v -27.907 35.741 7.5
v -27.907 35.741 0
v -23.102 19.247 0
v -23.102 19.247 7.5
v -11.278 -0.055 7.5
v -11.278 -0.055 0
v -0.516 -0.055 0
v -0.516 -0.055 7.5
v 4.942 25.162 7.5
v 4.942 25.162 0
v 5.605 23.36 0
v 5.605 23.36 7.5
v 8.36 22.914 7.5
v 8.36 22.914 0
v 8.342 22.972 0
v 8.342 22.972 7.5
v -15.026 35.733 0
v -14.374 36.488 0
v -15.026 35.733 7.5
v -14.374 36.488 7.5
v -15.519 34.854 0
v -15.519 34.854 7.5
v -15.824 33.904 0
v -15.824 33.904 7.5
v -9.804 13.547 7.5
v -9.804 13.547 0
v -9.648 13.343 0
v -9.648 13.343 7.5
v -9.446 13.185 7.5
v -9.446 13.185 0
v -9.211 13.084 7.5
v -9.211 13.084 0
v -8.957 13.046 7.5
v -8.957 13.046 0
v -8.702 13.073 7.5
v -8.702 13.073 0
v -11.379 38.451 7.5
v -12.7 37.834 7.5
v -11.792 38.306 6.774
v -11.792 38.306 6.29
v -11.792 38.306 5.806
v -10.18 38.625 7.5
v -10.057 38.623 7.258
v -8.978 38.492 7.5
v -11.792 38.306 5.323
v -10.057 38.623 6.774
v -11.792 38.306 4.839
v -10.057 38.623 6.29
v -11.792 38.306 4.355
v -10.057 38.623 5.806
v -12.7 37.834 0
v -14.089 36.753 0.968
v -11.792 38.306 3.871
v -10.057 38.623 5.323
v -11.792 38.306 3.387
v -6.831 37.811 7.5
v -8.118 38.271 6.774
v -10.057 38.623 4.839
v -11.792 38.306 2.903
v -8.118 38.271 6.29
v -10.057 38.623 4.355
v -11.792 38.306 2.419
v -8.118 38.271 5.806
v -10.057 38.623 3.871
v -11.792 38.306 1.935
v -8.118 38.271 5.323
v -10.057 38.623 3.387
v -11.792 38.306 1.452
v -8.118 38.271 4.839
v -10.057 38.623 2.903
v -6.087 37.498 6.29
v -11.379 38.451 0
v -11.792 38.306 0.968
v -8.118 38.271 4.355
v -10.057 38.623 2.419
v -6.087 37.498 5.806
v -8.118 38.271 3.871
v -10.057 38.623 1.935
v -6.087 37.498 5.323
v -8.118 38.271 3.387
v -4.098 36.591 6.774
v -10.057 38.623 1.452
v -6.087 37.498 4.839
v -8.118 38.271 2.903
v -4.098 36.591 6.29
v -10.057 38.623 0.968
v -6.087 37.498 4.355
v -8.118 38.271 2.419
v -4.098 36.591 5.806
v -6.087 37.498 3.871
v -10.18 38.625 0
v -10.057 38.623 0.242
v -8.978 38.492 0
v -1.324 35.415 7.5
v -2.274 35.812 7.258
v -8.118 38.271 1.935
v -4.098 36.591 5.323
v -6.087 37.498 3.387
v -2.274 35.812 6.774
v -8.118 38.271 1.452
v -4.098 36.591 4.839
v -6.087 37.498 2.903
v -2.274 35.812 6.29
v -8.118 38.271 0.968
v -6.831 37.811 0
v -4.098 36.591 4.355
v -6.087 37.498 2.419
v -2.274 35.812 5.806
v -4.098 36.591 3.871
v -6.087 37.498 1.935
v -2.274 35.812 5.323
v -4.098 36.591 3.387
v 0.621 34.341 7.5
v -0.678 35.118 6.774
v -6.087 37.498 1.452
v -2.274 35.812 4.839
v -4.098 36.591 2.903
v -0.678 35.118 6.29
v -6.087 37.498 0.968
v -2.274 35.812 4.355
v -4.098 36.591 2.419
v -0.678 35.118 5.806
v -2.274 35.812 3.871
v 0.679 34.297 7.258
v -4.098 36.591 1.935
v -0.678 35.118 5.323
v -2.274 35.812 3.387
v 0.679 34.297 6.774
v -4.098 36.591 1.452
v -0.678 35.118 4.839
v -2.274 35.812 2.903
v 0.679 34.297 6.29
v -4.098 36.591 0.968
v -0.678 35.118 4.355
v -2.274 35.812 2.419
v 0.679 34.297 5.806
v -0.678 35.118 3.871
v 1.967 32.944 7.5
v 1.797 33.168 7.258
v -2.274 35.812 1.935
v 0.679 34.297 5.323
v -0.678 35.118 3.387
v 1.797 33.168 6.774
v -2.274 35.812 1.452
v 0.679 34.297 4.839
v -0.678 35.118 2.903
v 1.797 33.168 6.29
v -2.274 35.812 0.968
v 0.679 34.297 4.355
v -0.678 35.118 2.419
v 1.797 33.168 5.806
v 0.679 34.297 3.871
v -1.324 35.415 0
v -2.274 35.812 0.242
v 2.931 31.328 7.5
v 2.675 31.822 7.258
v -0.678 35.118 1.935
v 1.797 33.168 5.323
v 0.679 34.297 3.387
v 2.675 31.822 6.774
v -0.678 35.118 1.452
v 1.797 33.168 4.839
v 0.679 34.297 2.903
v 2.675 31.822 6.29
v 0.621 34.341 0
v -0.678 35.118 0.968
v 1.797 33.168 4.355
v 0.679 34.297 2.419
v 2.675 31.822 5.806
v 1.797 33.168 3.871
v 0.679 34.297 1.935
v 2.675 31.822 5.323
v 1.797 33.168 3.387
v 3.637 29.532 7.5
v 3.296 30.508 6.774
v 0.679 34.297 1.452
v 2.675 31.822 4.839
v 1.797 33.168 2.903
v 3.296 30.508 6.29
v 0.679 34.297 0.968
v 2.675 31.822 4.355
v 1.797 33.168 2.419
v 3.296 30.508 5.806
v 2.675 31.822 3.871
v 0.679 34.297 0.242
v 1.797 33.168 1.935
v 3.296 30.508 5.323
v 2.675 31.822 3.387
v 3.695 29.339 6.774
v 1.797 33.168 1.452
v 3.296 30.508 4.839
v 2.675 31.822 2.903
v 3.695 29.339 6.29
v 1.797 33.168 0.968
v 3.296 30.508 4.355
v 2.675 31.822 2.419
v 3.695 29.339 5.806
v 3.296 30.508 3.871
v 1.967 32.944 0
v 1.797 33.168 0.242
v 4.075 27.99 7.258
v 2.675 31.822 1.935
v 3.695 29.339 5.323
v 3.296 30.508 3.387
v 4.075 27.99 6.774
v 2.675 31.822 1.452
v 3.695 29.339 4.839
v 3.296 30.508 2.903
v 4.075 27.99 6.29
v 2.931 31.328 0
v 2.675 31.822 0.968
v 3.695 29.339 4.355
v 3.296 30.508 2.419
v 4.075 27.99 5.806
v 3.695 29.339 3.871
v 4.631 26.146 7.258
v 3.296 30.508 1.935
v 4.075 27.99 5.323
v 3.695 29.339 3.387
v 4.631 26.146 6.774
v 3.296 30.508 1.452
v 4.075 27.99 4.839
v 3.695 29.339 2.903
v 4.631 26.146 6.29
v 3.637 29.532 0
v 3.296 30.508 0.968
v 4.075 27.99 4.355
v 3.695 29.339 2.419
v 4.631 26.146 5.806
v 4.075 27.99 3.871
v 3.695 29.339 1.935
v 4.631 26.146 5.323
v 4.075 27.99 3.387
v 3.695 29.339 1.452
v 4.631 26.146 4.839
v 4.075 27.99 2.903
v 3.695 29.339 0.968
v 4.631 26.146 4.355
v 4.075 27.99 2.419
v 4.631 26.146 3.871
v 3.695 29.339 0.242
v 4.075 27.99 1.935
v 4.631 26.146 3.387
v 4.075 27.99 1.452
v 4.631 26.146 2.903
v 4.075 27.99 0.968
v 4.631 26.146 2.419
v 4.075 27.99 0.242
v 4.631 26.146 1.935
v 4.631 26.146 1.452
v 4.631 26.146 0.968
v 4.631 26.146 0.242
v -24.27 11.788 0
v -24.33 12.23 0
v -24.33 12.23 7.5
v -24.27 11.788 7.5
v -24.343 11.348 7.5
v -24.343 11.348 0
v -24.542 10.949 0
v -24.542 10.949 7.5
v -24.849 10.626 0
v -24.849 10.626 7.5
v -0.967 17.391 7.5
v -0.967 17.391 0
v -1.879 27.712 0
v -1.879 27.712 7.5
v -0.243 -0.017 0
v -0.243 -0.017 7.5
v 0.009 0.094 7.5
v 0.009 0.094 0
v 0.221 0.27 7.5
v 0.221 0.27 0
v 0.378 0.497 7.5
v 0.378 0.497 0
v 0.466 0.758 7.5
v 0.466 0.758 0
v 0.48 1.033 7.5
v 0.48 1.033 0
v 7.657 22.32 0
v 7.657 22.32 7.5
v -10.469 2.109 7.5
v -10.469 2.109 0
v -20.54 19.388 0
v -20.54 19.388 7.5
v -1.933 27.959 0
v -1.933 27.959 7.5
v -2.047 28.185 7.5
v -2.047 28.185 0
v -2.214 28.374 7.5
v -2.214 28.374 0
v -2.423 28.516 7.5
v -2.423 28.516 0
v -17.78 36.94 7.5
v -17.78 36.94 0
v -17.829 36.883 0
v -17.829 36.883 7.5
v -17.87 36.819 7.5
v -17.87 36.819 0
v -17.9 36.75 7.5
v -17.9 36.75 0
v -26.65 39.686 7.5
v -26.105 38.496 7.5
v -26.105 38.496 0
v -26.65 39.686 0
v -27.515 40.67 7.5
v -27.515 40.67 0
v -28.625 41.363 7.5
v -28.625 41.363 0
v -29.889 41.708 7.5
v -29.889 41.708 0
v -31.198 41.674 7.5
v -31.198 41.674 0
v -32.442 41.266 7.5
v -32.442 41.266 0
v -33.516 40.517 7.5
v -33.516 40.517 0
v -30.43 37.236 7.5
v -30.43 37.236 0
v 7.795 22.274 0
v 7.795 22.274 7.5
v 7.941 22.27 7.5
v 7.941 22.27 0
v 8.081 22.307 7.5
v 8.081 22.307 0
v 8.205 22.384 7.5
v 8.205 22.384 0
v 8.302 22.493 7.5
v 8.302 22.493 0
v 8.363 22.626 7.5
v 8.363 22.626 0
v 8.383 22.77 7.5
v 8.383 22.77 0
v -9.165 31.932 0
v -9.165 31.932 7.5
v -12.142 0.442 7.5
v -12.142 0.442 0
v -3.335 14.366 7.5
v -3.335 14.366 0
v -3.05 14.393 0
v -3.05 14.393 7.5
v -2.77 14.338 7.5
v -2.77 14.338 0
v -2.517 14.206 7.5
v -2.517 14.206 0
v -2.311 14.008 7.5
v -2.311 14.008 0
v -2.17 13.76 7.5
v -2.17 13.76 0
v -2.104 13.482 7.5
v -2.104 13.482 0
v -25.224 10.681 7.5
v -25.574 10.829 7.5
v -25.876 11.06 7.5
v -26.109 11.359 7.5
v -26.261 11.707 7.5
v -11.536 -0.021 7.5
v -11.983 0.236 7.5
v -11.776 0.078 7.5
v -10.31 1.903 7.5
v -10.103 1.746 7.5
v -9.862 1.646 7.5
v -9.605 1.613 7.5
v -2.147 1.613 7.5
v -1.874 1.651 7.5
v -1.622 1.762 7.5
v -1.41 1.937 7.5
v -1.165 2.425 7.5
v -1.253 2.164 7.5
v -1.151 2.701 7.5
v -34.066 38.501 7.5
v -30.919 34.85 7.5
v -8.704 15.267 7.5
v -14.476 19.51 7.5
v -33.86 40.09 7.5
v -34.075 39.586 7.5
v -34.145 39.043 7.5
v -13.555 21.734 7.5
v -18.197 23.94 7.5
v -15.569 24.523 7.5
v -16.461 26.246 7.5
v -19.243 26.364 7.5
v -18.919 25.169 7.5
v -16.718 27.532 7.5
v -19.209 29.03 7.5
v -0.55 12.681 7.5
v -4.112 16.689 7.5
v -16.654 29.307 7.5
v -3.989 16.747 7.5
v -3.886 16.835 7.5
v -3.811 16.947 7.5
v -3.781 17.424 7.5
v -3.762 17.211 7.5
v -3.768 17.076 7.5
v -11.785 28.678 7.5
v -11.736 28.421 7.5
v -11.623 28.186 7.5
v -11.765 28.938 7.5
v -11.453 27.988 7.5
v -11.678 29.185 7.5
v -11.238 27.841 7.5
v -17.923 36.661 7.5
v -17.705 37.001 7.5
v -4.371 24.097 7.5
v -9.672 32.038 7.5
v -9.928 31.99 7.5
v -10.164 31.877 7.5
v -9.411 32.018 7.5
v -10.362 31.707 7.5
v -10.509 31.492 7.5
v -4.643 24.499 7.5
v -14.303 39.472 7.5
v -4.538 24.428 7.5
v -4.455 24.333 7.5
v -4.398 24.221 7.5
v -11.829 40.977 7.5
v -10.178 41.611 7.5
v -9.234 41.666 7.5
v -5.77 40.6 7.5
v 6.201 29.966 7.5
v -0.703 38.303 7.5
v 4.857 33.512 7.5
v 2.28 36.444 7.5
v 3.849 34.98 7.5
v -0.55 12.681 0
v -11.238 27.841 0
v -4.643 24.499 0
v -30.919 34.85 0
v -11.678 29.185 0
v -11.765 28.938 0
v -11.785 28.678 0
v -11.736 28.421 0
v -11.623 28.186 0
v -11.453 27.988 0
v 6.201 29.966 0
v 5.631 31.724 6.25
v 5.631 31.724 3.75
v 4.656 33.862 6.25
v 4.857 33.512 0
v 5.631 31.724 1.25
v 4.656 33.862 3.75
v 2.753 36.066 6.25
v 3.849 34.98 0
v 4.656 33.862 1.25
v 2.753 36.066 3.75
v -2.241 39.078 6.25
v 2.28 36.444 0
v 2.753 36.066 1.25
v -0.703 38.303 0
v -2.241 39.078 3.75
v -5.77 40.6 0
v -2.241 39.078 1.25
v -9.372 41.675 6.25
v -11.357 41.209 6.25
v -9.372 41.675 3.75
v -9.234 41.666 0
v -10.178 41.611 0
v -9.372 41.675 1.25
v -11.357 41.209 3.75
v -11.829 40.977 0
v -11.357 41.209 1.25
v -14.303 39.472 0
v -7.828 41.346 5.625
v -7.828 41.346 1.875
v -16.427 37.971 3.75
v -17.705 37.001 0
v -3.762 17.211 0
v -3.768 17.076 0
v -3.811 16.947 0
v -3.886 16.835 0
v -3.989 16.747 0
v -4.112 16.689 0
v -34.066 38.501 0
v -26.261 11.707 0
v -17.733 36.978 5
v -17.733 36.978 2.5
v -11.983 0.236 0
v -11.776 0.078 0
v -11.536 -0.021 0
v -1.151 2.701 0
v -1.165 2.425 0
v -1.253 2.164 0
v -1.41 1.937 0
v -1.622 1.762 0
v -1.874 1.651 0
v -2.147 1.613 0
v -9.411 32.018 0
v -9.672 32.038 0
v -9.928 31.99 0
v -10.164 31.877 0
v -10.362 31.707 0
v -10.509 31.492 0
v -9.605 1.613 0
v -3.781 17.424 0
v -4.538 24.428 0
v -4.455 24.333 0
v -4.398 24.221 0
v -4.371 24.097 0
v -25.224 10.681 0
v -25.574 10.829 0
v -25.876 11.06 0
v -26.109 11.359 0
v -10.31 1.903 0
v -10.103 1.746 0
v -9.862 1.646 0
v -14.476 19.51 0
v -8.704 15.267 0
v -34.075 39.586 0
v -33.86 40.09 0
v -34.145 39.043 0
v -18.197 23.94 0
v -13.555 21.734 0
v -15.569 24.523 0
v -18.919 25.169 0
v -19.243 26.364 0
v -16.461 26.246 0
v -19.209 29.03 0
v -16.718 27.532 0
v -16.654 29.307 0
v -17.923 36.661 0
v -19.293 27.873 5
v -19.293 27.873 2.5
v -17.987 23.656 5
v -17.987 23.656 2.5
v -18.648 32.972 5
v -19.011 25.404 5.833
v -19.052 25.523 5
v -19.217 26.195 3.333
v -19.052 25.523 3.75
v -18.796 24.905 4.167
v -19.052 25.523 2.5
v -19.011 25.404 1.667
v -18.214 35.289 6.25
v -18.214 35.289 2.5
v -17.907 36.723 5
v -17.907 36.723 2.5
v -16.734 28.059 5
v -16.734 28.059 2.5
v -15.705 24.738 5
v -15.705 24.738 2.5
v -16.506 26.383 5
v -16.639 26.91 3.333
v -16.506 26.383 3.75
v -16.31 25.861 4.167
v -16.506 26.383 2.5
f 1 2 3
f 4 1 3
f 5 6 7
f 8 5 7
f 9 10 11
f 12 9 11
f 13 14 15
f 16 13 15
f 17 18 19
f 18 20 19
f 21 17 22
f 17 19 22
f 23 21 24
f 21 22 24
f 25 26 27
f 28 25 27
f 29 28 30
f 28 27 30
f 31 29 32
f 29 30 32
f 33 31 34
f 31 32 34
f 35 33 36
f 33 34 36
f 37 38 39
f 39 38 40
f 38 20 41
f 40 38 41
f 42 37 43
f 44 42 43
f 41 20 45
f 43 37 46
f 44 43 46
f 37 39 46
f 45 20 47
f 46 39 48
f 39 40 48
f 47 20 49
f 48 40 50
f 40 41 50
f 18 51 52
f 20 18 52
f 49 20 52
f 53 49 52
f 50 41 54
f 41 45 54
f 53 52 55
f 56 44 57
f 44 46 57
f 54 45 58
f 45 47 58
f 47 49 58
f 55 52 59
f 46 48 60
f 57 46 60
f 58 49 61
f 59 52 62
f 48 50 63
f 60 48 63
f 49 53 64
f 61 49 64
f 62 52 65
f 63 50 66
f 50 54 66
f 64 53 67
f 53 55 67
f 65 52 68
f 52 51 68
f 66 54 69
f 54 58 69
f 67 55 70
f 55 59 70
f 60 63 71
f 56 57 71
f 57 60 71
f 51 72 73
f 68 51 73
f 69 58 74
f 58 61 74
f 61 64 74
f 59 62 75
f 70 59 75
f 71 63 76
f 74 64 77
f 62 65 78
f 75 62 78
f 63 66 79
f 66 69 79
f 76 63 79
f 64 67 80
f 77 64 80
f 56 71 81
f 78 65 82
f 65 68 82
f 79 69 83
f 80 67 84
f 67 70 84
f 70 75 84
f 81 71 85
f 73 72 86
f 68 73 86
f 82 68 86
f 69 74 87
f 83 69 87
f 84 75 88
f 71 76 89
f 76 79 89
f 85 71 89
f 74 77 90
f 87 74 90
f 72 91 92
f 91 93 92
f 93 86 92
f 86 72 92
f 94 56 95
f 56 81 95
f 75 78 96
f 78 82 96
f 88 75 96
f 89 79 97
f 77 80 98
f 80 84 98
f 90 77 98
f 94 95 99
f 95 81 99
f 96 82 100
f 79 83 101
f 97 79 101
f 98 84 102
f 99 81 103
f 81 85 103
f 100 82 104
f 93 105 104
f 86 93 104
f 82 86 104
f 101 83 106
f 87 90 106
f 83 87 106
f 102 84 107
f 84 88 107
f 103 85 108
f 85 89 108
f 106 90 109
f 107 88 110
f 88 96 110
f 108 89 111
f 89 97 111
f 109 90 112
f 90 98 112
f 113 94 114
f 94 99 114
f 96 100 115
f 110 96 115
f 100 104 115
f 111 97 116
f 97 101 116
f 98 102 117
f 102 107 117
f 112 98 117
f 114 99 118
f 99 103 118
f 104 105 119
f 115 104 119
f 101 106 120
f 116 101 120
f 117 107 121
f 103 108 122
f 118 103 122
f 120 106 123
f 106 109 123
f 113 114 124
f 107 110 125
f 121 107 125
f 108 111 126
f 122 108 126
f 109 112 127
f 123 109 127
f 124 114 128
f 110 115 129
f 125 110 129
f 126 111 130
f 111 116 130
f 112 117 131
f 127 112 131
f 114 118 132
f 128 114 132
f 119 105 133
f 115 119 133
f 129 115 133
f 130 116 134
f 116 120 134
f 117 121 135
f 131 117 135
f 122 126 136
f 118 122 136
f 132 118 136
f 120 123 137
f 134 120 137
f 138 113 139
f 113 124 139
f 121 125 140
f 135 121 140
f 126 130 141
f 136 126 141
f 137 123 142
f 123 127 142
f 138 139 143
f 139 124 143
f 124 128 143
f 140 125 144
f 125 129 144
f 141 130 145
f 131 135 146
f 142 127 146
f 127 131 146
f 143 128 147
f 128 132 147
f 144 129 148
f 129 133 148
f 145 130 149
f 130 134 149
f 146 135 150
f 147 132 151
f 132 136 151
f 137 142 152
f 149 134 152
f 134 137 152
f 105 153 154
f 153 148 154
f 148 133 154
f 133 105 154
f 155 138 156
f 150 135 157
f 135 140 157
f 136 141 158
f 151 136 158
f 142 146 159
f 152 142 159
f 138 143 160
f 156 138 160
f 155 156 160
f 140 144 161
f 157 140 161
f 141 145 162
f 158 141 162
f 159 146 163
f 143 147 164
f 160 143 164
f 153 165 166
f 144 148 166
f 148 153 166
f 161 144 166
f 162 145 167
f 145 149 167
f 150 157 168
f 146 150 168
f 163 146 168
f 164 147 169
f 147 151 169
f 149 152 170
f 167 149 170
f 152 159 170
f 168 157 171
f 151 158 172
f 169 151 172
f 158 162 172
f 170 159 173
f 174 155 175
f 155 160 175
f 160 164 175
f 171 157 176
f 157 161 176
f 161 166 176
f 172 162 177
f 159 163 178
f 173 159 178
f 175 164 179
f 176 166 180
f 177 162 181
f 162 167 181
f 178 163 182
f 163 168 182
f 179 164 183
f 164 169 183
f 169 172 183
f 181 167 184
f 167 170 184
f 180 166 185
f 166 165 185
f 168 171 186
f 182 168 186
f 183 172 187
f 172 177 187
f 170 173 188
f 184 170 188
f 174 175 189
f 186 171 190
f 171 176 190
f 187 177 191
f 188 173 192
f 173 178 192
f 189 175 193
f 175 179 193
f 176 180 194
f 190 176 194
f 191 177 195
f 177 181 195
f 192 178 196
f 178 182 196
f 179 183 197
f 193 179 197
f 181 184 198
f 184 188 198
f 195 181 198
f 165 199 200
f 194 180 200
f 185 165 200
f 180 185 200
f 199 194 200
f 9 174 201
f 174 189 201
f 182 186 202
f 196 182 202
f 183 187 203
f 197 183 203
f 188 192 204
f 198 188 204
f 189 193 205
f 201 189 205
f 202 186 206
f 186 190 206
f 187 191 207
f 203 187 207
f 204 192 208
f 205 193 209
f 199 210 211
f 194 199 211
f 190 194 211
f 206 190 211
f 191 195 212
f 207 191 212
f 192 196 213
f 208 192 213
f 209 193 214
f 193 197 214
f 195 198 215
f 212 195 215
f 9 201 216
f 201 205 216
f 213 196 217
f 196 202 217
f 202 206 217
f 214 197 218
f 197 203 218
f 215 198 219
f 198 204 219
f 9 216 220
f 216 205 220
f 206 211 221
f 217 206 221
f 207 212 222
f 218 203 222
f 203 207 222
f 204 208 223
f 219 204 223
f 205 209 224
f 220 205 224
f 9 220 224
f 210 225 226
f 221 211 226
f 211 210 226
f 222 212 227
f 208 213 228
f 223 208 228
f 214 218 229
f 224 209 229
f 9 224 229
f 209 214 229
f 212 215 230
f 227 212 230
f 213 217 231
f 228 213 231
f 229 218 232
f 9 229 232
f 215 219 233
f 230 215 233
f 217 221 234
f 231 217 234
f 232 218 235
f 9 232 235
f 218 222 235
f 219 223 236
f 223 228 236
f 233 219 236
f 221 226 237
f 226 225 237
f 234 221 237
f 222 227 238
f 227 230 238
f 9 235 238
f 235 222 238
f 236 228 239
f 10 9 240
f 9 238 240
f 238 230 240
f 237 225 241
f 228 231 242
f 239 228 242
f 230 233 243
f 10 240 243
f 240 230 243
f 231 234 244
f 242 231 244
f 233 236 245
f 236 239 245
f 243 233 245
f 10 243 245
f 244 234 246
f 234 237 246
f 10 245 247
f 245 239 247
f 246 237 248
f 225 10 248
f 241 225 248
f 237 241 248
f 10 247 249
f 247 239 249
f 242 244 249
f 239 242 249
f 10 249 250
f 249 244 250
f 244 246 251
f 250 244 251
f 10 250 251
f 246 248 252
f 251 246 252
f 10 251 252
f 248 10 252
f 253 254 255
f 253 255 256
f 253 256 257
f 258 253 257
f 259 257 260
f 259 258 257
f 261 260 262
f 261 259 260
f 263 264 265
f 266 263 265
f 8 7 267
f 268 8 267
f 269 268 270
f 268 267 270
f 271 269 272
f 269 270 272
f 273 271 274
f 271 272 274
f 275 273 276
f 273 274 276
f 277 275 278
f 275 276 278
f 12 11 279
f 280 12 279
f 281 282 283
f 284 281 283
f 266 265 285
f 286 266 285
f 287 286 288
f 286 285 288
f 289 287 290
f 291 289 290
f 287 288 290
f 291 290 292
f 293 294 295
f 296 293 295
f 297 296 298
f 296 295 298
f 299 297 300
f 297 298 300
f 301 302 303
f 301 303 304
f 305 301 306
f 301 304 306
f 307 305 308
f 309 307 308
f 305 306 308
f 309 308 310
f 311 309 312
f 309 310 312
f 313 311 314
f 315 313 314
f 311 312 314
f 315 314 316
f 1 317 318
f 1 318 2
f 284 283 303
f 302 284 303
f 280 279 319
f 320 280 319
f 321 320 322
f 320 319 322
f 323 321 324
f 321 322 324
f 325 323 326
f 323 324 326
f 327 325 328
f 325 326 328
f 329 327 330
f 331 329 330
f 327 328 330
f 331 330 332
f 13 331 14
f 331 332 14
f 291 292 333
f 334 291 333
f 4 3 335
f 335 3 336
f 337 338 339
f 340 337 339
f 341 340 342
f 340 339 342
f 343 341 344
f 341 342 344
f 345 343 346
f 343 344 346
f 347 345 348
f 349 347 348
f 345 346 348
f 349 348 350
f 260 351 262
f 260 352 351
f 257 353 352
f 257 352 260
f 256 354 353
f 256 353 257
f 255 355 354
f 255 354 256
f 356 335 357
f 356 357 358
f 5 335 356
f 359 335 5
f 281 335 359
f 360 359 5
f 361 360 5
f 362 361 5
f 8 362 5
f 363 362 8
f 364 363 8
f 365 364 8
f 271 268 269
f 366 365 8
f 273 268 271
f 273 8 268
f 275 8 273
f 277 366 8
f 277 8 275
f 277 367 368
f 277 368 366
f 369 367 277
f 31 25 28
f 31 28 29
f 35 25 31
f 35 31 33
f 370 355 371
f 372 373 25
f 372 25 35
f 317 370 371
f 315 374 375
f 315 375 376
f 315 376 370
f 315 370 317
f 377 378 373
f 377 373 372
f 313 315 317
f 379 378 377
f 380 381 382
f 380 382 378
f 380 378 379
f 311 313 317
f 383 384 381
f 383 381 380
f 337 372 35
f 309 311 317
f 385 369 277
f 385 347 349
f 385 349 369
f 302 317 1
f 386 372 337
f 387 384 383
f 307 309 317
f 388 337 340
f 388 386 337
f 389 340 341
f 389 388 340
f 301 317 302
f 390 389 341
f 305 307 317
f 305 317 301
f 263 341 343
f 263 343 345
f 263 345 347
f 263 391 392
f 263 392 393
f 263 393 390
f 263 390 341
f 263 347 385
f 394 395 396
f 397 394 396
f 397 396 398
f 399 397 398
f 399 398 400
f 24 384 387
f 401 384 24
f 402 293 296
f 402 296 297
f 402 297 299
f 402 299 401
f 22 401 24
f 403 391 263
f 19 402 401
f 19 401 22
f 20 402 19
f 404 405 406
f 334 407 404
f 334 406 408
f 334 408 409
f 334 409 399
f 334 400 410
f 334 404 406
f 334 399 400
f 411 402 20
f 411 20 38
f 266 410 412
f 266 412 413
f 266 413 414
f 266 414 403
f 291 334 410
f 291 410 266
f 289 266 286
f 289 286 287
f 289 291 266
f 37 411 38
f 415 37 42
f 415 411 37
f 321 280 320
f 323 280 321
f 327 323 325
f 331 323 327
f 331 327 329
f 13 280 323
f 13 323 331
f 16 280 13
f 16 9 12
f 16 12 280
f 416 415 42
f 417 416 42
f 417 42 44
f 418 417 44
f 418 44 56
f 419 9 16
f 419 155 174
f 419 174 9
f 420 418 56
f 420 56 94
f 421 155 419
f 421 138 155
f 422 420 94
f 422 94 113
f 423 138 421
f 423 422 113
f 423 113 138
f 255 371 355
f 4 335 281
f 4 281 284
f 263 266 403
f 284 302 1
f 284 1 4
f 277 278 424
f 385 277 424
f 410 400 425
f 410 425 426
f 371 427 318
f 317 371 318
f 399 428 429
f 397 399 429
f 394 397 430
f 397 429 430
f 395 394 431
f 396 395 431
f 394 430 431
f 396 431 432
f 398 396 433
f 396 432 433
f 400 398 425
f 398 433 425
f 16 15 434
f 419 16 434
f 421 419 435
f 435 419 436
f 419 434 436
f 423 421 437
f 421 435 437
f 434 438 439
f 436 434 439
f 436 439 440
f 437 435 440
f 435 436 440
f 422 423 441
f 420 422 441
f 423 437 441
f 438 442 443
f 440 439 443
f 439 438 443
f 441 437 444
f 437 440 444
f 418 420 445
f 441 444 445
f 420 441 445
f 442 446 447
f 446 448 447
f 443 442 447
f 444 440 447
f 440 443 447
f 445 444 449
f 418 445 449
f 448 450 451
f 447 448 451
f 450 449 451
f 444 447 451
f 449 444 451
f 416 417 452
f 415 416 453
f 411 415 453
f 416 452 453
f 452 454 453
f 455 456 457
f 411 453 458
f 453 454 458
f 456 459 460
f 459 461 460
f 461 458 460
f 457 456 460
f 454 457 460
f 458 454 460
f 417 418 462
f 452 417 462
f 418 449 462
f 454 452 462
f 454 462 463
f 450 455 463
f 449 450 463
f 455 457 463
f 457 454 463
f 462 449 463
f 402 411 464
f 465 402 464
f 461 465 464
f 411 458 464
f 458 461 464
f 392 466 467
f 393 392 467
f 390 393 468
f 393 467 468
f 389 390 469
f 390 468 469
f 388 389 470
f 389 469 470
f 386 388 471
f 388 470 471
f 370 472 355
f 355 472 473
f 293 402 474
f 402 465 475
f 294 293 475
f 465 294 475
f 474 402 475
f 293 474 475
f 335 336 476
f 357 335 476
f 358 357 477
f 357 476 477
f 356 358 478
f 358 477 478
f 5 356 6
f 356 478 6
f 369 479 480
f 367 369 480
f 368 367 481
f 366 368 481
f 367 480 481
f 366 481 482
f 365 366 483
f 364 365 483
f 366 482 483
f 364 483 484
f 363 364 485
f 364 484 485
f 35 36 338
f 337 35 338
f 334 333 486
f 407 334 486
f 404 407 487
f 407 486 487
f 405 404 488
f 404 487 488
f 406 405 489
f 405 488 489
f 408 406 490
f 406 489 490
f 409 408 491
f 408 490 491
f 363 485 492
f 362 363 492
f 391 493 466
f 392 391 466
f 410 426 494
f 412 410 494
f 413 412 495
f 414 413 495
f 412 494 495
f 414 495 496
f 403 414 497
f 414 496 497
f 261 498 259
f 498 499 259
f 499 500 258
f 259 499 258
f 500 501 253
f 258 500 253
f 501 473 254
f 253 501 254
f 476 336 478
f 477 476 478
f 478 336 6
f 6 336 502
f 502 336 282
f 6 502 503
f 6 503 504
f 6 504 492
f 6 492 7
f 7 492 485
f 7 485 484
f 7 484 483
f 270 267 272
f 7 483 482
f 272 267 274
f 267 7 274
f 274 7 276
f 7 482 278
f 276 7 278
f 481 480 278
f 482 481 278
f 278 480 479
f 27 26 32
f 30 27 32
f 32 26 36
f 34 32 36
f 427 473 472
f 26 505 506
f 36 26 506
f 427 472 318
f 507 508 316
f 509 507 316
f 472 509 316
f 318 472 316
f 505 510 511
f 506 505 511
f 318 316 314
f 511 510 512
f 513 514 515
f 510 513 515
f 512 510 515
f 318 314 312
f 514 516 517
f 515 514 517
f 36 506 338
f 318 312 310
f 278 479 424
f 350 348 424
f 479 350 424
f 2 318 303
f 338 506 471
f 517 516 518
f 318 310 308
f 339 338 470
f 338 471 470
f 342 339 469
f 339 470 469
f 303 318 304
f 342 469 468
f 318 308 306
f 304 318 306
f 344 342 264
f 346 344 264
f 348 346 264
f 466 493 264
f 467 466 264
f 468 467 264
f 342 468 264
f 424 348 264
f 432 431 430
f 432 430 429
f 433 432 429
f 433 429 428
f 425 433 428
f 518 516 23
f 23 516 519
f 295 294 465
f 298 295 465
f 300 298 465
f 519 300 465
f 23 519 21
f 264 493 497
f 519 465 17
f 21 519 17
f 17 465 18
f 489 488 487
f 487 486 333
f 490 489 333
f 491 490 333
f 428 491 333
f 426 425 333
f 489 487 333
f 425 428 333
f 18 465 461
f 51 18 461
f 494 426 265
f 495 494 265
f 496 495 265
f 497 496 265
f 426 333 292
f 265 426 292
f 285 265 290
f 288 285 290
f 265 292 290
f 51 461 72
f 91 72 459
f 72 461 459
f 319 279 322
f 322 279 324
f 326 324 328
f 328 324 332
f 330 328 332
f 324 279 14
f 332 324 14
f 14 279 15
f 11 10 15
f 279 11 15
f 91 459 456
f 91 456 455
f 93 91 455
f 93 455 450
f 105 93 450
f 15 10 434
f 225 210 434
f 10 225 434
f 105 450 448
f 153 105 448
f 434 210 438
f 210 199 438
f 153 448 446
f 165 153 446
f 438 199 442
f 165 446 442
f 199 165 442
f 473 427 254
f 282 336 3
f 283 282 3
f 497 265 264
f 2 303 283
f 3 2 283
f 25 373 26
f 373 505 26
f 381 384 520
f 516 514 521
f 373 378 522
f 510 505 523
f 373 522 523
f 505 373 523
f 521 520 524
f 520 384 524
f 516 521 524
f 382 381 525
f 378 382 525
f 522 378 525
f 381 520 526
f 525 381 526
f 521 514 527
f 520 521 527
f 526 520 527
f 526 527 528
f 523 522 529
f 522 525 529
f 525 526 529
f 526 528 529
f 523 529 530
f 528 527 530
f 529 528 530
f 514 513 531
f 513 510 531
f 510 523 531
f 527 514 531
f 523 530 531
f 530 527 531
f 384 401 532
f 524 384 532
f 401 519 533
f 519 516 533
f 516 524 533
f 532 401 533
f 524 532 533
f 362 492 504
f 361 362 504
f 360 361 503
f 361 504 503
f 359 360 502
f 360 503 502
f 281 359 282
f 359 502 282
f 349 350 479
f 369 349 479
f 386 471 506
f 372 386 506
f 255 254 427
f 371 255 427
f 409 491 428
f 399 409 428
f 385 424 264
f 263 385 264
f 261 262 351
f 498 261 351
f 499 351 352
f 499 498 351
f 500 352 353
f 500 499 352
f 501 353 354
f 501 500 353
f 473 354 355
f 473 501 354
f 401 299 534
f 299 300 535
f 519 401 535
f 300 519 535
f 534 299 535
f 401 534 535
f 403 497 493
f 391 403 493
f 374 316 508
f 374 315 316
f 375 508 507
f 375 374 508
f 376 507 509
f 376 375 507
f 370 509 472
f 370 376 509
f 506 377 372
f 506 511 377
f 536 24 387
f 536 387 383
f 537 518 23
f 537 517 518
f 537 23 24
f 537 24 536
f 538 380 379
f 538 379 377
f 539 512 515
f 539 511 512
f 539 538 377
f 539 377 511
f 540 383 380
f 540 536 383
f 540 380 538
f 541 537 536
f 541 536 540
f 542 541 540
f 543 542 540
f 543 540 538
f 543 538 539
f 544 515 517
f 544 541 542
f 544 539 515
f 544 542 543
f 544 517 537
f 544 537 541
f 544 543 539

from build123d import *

# Parameters (mm, degrees)
F1_DEPTH    = 7.5
F2_T1_DEPTH = 15.2889844522
F2_T3_DEPTH = 14.7217373581
F3_R        = 5
F4_R        = 2


# Not quite as in the source:
# - a fillet or chamfer that OpenCascade refuses, or shapes differently, is made with other operations: its cross-section is extruded or revolved along the edge and cut away or added
# - the dataset's text gives a spline's control points without its knots; the knots are read off the source's solid


with BuildPart() as f1:
    # F0 (on Top) → F1 (new body)
    with BuildSketch(Plane.XY):
        with BuildLine():
            Line((-30.4297231978, 37.2361281484), (-27.9068994648, 35.7413323143))
            Line((-27.9068994648, 35.7413323143), (-23.1022062055, 19.2465248053))
            Line((-23.1022062055, 19.2465248053), (-12.1421488415, 0.4418746424))
            ThreePointArc((-12.1421488415, 0.4418746424), (-11.7764047105, 0.0783760722), (-11.2781835948, -0.0545739178))
            Line((-11.2781835948, -0.0545739178), (-0.5164044179, -0.0545739178))
            ThreePointArc((-0.5164044179, -0.0545739178), (0.2211832141, 0.2701746585), (0.4797097793, 1.0334971119))
            Line((0.4797097793, 1.0334971119), (-0.5501098771, 12.6811181757))
            Line((-0.5501098771, 12.6811181757), (-0.9665210168, 17.3908740359))
            Line((-0.9665210168, 17.3908740359), (-1.8790748935, 27.7121780525))
            ThreePointArc((-1.8790748935, 27.7121780525), (-2.0470497932, 28.1846293722), (-2.4232402919, 28.5161509026))
            Line((-2.4232402919, 28.5161509026), (-9.1651293115, 31.931889425))
            ThreePointArc((-9.1651293115, 31.931889425), (-9.9282723264, 31.9901918821), (-10.50912199, 31.4917943441))
            Line((-10.50912199, 31.4917943441), (-11.6780597733, 29.1845776897))
            ThreePointArc((-11.6780597733, 29.1845776897), (-11.7363622304, 28.4214346748), (-11.2379646923, 27.8405850112))
            Line((-11.2379646923, 27.8405850112), (-4.6428148812, 24.499191048))
            ThreePointArc((-4.6428148812, 24.499191048), (-4.4547196319, 24.3334302828), (-4.370732182, 24.097204623))
            Line((-4.370732182, 24.097204623), (-3.7807636833, 17.4244542335))
            Line((-3.7807636833, 17.4244542335), (-3.7619000234, 17.2110996318))
            ThreePointArc((-3.7619000234, 17.2110996318), (-3.8447935162, 16.8884260354), (-4.1120023476, 16.6894561347))
            Line((-4.1120023476, 16.6894561347), (-8.7035508168, 15.2670730452))
            add(Edge.make_bspline(
                [(-15.5142657673, 35.3507988058), (-16.1010755157, 32.5985703523), (-17.1494817729, 28.0372519615), (-15.947461142, 24.3954661972), (-11.3028420672, 19.0091491745), (-8.7035508168, 15.2670730452)],
                knots=[0, 0, 0, 0, 0.3392145091, 0.5718363816, 1, 1, 1, 1], degree=3))
            add(Edge.make_bspline(
                [(-15.5142657673, 35.3507988058), (-15.0440821248, 35.8322924551), (-14.1012745944, 36.7950332484), (-12.8603615018, 37.7878852095), (-11.798829502, 38.3315249945), (-10.960746448, 38.5863831942), (-10.0673858916, 38.6529058616), (-9.1141266995, 38.5405856329), (-8.1216983172, 38.2884636716), (-7.1063789778, 37.9305416741), (-6.0852486156, 37.5030969594), (-5.0746543782, 37.0427025856), (-4.0904435755, 36.5841639606), (-3.1487348398, 36.1695070149), (-2.2640452318, 35.8087630666), (-1.4362912989, 35.4682005173), (-0.667516675, 35.1230266013), (0.0411482358, 34.745905475), (0.6890718757, 34.31218751), (1.2766173569, 33.7895061105), (1.8074190243, 33.1765478565), (2.2779053445, 32.5103349131), (2.6859571098, 31.8206108547), (3.0297312381, 31.1384148993), (3.3064025308, 30.4975143414), (3.5178737246, 29.9196286172), (3.6959800621, 29.3465425456), (3.8692027201, 28.7283066119), (4.0337210144, 28.1331983491), (4.1916693597, 27.5848116783), (4.3725168618, 26.9787861335), (4.6299932224, 26.1462091657), (4.8417441396, 25.4774887899), (4.9422006393, 25.1616837102)],
                knots=[0, 0, 0, 0, 0.0498708284, 0.0997416568, 0.1246770709, 0.1496124851, 0.1745478993, 0.1994833135, 0.2244187277, 0.2493541419, 0.2742895561, 0.2992249703, 0.3241603844, 0.3490957986, 0.3740312128, 0.398966627, 0.4239020412, 0.4488374554, 0.4737728696, 0.4987082838, 0.5236436979, 0.5485791121, 0.5735145263, 0.5984499405, 0.6233853547, 0.6483207689, 0.6732561831, 0.6981915973, 0.7231270114, 0.7355947185, 0.7480624256, 0.7729978398, 0.797933254, 0.797933254, 0.797933254, 0.797933254], degree=3))
            Line((4.9422006393, 25.1616837102), (5.6051399225, 23.3596070707))
            Line((5.6051399225, 23.3596070707), (7.6567647722, 22.3201633759))
            ThreePointArc((7.6567647722, 22.3201633759), (8.2052790129, 22.3841276621), (8.3603471538, 22.9141400901))
            Line((8.3603471538, 22.9141400901), (8.3424245162, 22.9719955723))
            add(Edge.make_bspline(
                [(8.3424245162, 22.9719955723), (7.7488944153, 24.8545905089), (6.67729679, 28.253534975), (5.6930167186, 31.8382348733), (3.5011406257, 36.8403453764), (-7.5398608959, 41.4475683268), (-10.9611276957, 42.1663875514), (-17.0110458735, 37.5497083277), (-17.7048493275, 37.0005035791)],
                knots=[0, 0, 0, 0, 0.0984429904, 0.1773696293, 0.2725166361, 0.412807835, 0.4962393226, 0.6112830896, 0.6112830896, 0.6112830896, 0.6112830896], degree=3))
            add(Edge.make_bspline(
                [(-17.7048493275, 37.0005035791), (-17.7345511384, 36.9769920565), (-17.7590976226, 36.9573783291), (-17.7796839194, 36.9397418581)],
                knots=[0.6112830896, 0.6112830896, 0.6112830896, 0.6112830896, 0.6162081274, 0.6162081274, 0.6162081274, 0.6162081274], degree=3))
            ThreePointArc((-17.7796839194, 36.9397418581), (-17.850702418, 36.8517272472), (-17.9001241505, 36.750003645))
            add(Edge.make_bspline(
                [(-17.9001241505, 36.750003645), (-17.907153429, 36.7248909598), (-17.9143126936, 36.695697636), (-17.9225929782, 36.6608311238)],
                knots=[0.6331345136, 0.6331345136, 0.6331345136, 0.6331345136, 0.6377615142, 0.6377615142, 0.6377615142, 0.6377615142], degree=3))
            add(Edge.make_bspline(
                [(-17.9225929782, 36.6608311238), (-18.145074403, 35.7240093049), (-19.9037327351, 27.1462156298), (-18.3649930119, 23.476055144), (-12.5997298189, 17.7007658301), (-9.8035750323, 13.5473699634)],
                knots=[0.6377615142, 0.6377615142, 0.6377615142, 0.6377615142, 0.7620835298, 0.8496665033, 1, 1, 1, 1], degree=3))
            ThreePointArc((-9.8035750323, 13.5473699634), (-9.3318550602, 13.126966392), (-8.7022699851, 13.0732865238))
            Line((-8.7022699851, 13.0732865238), (-3.3345946353, 14.3662985288))
            ThreePointArc((-3.3345946353, 14.3662985288), (-2.5168389495, 14.2061733755), (-2.1042906941, 13.4821786494))
            Line((-2.1042906941, 13.4821786494), (-1.1510458373, 2.7006453938))
            ThreePointArc((-1.1510458373, 2.7006453938), (-1.4095724025, 1.9373229405), (-2.1471600344, 1.6125743641))
            Line((-2.1471600344, 1.6125743641), (-9.6046174943, 1.6125743641))
            ThreePointArc((-9.6046174943, 1.6125743641), (-10.1028386099, 1.7455243541), (-10.468582741, 2.1090229244))
            Line((-10.468582741, 2.1090229244), (-20.5396115367, 19.3883278582))
            Line((-20.5396115367, 19.3883278582), (-26.1053241383, 38.4957615815))
            ThreePointArc((-26.1053241383, 38.4957615815), (-29.9052669683, 41.7096110505), (-34.3455150255, 39.4618141043))
            Line((-34.3455150255, 39.4618141043), (-25.8251781299, 10.2109734327))
            Line((-25.8251781299, 10.2109734327), (-24.8756555892, 10.5269434158))
            Line((-24.8756555892, 10.5269434158), (-23.9261330484, 10.8429133989))
            Line((-23.9261330484, 10.8429133989), (-30.9189620372, 34.8497254653))
            Line((-30.9189620372, 34.8497254653), (-30.4297231978, 37.2361281484))
        make_face()
    extrude(amount=F1_DEPTH)

    # F2: fillet of radius 1.5 on 2 edges, made by hand

    # F2_s2 → F2_t1 (cut)
    with BuildSketch(Plane.XY.offset(-3.8944922261)):
        with BuildLine():
            ThreePointArc((-24.3470714005, 10.7028389106), (-25.5174199076, 10.7977363038), (-26.2608354224, 11.7066117163))
            Line((-26.2608354224, 11.7066117163), (-25.8251781299, 10.2109734327))
            Line((-25.8251781299, 10.2109734327), (-24.3470714005, 10.7028389106))
        make_face()
    extrude(amount=F2_T1_DEPTH, mode=Mode.SUBTRACT)

    # F2_s4 → F2_t3 (cut)
    with BuildSketch(Plane.XY.offset(-3.6108686791)):
        with BuildLine():
            ThreePointArc((-24.3300627987, 12.2296290784), (-24.4418412958, 11.1134033384), (-25.2965939413, 10.3868689275))
            Line((-25.2965939413, 10.3868689275), (-23.9261330484, 10.8429133989))
            Line((-23.9261330484, 10.8429133989), (-24.3300627987, 12.2296290784))
        make_face()
    extrude(amount=F2_T3_DEPTH, mode=Mode.SUBTRACT)

    # F3
    f3_edges = [f1.edges().sort_by_distance(p)[0] for p in [
        (-15.514266, 35.350799, 3.75),
    ]]
    fillet(f3_edges, radius=F3_R)

    # F4
    f4_edges = [f1.edges().sort_by_distance(p)[0] for p in [
        (-34.345515, 39.461814, 3.75),
    ]]
    fillet(f4_edges, radius=F4_R)


solid = f1.part
